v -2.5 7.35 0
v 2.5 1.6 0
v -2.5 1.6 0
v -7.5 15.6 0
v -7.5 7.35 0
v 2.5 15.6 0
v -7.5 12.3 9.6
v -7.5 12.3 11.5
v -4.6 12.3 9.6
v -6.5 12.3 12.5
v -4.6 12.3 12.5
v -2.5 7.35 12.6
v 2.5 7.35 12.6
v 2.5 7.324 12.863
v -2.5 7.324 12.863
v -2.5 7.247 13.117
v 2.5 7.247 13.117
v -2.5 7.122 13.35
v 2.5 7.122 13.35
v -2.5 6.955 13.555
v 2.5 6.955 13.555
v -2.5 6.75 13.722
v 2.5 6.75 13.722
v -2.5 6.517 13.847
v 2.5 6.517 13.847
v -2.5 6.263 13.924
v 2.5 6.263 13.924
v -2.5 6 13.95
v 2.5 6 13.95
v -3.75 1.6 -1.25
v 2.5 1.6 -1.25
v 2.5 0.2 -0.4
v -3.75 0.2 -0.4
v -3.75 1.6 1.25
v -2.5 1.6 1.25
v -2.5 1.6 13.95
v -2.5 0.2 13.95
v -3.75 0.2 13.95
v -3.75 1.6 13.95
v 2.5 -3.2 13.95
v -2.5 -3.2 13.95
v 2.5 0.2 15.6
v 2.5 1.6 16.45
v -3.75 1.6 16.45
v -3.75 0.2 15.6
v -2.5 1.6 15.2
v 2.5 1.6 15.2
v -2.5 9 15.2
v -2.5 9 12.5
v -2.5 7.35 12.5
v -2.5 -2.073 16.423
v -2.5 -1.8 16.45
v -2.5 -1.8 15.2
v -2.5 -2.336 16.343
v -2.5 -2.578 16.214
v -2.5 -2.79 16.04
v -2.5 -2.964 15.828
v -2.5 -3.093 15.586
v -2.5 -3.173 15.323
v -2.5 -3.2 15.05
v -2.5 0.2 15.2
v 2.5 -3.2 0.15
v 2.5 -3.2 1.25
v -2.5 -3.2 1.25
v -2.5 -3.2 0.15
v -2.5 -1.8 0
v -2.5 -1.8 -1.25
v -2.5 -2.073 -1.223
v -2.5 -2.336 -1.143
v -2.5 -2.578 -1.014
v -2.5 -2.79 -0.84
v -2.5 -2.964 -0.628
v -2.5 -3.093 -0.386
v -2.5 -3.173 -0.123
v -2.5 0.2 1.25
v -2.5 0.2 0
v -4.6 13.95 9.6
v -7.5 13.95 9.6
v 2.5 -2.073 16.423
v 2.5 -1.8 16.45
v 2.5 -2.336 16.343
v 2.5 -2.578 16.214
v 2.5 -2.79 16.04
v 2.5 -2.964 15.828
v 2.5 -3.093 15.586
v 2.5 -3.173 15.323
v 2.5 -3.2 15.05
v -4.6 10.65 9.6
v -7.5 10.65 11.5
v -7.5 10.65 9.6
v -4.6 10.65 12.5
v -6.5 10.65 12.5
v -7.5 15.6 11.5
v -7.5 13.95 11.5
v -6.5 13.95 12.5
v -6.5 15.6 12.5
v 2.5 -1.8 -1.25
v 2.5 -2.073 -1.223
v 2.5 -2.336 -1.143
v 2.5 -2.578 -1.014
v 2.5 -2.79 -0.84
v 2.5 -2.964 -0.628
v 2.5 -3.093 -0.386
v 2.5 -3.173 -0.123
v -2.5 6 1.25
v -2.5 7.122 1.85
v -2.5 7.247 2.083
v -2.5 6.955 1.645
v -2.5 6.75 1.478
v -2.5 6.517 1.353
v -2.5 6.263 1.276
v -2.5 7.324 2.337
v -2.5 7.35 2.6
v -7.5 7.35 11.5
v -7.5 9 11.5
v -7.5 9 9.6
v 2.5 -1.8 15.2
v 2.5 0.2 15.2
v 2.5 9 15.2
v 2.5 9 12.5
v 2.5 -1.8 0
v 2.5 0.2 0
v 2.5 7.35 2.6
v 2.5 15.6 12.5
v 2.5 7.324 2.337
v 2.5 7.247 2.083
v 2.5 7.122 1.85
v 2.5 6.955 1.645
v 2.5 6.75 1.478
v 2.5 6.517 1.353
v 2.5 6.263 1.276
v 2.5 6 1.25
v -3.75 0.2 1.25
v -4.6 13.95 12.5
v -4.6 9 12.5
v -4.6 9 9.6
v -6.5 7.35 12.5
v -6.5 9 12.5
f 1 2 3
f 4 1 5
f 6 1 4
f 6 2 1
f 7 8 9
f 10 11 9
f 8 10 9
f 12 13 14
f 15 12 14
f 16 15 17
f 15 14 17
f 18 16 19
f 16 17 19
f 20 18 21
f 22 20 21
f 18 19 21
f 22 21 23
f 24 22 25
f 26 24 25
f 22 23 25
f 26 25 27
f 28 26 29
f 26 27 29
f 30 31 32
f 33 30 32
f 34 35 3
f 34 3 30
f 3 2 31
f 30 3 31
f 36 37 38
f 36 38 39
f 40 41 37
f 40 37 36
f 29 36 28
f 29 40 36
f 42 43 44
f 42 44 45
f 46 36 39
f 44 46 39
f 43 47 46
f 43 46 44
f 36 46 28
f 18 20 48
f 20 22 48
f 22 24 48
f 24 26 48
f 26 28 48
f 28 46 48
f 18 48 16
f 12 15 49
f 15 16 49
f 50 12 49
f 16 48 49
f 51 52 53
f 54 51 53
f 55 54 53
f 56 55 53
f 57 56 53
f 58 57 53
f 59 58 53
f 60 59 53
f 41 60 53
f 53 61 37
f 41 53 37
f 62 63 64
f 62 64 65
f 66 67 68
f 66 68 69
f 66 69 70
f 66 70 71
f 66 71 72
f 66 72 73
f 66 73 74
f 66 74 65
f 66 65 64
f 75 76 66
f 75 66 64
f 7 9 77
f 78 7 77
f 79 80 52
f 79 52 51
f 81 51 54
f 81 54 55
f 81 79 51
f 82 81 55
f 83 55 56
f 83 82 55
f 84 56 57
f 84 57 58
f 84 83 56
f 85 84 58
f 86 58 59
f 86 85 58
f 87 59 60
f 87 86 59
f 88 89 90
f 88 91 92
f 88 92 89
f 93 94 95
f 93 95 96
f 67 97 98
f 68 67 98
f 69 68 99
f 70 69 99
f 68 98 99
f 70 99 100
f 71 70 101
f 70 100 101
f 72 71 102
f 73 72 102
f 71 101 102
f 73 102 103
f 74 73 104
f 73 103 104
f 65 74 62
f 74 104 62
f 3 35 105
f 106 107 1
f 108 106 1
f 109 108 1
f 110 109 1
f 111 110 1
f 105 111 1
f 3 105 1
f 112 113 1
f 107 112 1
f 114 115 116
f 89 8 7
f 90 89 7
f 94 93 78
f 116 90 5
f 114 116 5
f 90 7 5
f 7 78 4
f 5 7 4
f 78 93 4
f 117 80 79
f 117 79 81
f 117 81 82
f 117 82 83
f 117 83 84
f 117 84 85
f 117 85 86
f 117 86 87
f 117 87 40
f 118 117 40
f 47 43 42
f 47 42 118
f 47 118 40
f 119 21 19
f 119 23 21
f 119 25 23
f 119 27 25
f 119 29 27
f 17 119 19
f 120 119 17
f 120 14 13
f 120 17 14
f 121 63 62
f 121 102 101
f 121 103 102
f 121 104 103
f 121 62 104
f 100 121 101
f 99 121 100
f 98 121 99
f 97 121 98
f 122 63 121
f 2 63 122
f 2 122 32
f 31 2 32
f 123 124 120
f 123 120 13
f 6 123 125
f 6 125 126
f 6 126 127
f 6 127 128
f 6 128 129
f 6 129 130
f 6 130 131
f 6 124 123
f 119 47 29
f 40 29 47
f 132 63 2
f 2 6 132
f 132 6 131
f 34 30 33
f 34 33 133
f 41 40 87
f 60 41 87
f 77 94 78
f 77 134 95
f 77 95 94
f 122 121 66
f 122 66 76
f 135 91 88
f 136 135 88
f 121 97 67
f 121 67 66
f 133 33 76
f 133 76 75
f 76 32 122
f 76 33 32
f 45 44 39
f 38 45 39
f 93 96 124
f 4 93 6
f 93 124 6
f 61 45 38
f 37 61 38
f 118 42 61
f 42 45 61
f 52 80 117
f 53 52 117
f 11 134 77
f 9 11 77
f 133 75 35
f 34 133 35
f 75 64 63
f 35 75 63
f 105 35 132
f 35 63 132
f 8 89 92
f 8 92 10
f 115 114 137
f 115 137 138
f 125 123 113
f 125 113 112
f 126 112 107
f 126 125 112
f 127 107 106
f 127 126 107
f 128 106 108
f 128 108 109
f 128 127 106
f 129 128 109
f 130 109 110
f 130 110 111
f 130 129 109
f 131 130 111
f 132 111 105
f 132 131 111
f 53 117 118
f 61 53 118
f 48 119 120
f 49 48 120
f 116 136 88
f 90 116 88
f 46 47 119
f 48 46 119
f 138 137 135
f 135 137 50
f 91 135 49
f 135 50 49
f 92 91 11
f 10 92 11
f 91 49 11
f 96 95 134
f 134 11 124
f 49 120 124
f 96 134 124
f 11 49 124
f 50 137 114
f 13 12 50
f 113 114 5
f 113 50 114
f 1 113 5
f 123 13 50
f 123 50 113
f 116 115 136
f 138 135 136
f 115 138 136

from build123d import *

# Parameters (mm, degrees)
PAD017_DEPTH              = 5
PAD020_DEPTH              = 6.25
SKETCH038_W               = 10
SKETCH038_H               = 1.65
PAD021_DEPTH              = 5
SKETCH078_W               = 12.5
SKETCH078_H               = 1.65
PAD047_DEPTH              = 10
SKETCH076_W               = 9.6
SKETCH076_H               = 1.65
PAD048_DEPTH              = 10
SKETCH075_W               = 12.5
SKETCH075_H               = 1.65
PAD049_DEPTH              = 7.1
SKETCH077_W               = 12.5
SKETCH077_H               = 1.65
PAD050_DEPTH              = 10
LINEARPATTERN017_COUNT    = 2
LINEARPATTERN017_PITCH    = 3.3
CHAMFER007_SIZE           = 1
MIRROR009_PLACEMENT_ANGLE = 90


with BuildPart() as bc_c:
    # Sketch034 → Pad017 (new body)
    with BuildSketch(Plane.XY):
        with BuildLine():
            Line((-1.35, -1.8), (-1.35, 6))
            ThreePointArc((0, 7.35), (-0.954594, 6.954594), (-1.35, 6))
            Line((0, 9), (0, 7.35))
            Line((-2.6, 9), (0, 9))
            Line((-2.6, -1.8), (-2.6, 9))
            Line((-3.85, -1.8), (-2.6, -1.8))
            ThreePointArc((-3.85, -1.8), (-3.439949, -2.789949), (-2.45, -3.2))
            Line((-1.35, -3.2), (-2.45, -3.2))
            Line((-1.35, -1.8), (-1.35, -3.2))
        make_face()
    extrude(amount=PAD017_DEPTH)

    # Sketch037 → Pad020 (join)
    with BuildSketch(Plane.XY):
        Polygon((-1.35, 0.2), (-1.35, 1.6), (-2.6, 1.6), (-3.85, 1.6), (-3, 0.2), (-2.6, 0.2), align=None)
    extrude(amount=PAD020_DEPTH)


with BuildPart() as body026:
    # Mirror002: instance of _bc_c
    add(bc_c.part.mirror(Plane(origin=(5, 0, 0), x_dir=(0, 1, 0), z_dir=(-1, 0, 0))))

    # Fusion002: union _bc_c
    add(bc_c.part)


with BuildPart() as body026_1:
    # Clone003 placement: moved
    add(body026.part.moved(Location((-5, 0, 0))))

    # Sketch038 → Pad021 (new body)
    with BuildSketch(Plane.XY):
        with Locations((0, 8.175)):
            Rectangle(SKETCH038_W, SKETCH038_H)
    extrude(amount=PAD021_DEPTH)

    # Sketch078 → Pad047 (new body)
    with BuildSketch(Plane.XY):
        with Locations((1.35, 8.175)):
            Rectangle(SKETCH078_W, SKETCH078_H)
    extrude(amount=PAD047_DEPTH)

    # Sketch076 → Pad048 (join)
    with BuildSketch(Plane.XY):
        with Locations((2.8, 9.825)):
            Rectangle(SKETCH076_W, SKETCH076_H)
    pad048 = extrude(amount=PAD048_DEPTH)

    # Sketch075 → Pad049 (join)
    with BuildSketch(Plane.XY):
        with Locations((1.35, 9.825)):
            Rectangle(SKETCH075_W, SKETCH075_H)
    pad049 = extrude(amount=PAD049_DEPTH)

    # Sketch077 → Pad050 (join)
    with BuildSketch(Plane.XY):
        with Locations((1.35, 11.475)):
            Rectangle(SKETCH077_W, SKETCH077_H)
    pad050 = extrude(amount=PAD050_DEPTH)

    # LinearPattern017: Pad050, Pad049, Pad048 ×2
    with Locations(*[(0, i * LINEARPATTERN017_PITCH, 0) for i in range(1, LINEARPATTERN017_COUNT)]):
        add(pad050)
        add(pad049)
        add(pad048)

    # Chamfer007
    chamfer007_edges = [body026_1.edges().sort_by_distance(p)[0] for p in [
        (-4.9, 8.175, 10),
        (-4.9, 11.475, 10),
        (-4.9, 14.775, 10),
    ]]
    chamfer(chamfer007_edges, length=CHAMFER007_SIZE)


with BuildPart() as mirror009:
    # Mirror009: instance of Body026
    add(body026_1.part.mirror(Plane(origin=(0, 0, 0), x_dir=(0, -1, 0), z_dir=(1, 0, 0))))


with BuildPart() as mirror009_1:
    # Mirror009 placement: moved
    add(mirror009.part.moved(Location((2.5, 0, 7.6))).rotate(Axis((2.5, 0, 7.6), (0, -1, 0)), MIRROR009_PLACEMENT_ANGLE))


solid = mirror009_1.part
